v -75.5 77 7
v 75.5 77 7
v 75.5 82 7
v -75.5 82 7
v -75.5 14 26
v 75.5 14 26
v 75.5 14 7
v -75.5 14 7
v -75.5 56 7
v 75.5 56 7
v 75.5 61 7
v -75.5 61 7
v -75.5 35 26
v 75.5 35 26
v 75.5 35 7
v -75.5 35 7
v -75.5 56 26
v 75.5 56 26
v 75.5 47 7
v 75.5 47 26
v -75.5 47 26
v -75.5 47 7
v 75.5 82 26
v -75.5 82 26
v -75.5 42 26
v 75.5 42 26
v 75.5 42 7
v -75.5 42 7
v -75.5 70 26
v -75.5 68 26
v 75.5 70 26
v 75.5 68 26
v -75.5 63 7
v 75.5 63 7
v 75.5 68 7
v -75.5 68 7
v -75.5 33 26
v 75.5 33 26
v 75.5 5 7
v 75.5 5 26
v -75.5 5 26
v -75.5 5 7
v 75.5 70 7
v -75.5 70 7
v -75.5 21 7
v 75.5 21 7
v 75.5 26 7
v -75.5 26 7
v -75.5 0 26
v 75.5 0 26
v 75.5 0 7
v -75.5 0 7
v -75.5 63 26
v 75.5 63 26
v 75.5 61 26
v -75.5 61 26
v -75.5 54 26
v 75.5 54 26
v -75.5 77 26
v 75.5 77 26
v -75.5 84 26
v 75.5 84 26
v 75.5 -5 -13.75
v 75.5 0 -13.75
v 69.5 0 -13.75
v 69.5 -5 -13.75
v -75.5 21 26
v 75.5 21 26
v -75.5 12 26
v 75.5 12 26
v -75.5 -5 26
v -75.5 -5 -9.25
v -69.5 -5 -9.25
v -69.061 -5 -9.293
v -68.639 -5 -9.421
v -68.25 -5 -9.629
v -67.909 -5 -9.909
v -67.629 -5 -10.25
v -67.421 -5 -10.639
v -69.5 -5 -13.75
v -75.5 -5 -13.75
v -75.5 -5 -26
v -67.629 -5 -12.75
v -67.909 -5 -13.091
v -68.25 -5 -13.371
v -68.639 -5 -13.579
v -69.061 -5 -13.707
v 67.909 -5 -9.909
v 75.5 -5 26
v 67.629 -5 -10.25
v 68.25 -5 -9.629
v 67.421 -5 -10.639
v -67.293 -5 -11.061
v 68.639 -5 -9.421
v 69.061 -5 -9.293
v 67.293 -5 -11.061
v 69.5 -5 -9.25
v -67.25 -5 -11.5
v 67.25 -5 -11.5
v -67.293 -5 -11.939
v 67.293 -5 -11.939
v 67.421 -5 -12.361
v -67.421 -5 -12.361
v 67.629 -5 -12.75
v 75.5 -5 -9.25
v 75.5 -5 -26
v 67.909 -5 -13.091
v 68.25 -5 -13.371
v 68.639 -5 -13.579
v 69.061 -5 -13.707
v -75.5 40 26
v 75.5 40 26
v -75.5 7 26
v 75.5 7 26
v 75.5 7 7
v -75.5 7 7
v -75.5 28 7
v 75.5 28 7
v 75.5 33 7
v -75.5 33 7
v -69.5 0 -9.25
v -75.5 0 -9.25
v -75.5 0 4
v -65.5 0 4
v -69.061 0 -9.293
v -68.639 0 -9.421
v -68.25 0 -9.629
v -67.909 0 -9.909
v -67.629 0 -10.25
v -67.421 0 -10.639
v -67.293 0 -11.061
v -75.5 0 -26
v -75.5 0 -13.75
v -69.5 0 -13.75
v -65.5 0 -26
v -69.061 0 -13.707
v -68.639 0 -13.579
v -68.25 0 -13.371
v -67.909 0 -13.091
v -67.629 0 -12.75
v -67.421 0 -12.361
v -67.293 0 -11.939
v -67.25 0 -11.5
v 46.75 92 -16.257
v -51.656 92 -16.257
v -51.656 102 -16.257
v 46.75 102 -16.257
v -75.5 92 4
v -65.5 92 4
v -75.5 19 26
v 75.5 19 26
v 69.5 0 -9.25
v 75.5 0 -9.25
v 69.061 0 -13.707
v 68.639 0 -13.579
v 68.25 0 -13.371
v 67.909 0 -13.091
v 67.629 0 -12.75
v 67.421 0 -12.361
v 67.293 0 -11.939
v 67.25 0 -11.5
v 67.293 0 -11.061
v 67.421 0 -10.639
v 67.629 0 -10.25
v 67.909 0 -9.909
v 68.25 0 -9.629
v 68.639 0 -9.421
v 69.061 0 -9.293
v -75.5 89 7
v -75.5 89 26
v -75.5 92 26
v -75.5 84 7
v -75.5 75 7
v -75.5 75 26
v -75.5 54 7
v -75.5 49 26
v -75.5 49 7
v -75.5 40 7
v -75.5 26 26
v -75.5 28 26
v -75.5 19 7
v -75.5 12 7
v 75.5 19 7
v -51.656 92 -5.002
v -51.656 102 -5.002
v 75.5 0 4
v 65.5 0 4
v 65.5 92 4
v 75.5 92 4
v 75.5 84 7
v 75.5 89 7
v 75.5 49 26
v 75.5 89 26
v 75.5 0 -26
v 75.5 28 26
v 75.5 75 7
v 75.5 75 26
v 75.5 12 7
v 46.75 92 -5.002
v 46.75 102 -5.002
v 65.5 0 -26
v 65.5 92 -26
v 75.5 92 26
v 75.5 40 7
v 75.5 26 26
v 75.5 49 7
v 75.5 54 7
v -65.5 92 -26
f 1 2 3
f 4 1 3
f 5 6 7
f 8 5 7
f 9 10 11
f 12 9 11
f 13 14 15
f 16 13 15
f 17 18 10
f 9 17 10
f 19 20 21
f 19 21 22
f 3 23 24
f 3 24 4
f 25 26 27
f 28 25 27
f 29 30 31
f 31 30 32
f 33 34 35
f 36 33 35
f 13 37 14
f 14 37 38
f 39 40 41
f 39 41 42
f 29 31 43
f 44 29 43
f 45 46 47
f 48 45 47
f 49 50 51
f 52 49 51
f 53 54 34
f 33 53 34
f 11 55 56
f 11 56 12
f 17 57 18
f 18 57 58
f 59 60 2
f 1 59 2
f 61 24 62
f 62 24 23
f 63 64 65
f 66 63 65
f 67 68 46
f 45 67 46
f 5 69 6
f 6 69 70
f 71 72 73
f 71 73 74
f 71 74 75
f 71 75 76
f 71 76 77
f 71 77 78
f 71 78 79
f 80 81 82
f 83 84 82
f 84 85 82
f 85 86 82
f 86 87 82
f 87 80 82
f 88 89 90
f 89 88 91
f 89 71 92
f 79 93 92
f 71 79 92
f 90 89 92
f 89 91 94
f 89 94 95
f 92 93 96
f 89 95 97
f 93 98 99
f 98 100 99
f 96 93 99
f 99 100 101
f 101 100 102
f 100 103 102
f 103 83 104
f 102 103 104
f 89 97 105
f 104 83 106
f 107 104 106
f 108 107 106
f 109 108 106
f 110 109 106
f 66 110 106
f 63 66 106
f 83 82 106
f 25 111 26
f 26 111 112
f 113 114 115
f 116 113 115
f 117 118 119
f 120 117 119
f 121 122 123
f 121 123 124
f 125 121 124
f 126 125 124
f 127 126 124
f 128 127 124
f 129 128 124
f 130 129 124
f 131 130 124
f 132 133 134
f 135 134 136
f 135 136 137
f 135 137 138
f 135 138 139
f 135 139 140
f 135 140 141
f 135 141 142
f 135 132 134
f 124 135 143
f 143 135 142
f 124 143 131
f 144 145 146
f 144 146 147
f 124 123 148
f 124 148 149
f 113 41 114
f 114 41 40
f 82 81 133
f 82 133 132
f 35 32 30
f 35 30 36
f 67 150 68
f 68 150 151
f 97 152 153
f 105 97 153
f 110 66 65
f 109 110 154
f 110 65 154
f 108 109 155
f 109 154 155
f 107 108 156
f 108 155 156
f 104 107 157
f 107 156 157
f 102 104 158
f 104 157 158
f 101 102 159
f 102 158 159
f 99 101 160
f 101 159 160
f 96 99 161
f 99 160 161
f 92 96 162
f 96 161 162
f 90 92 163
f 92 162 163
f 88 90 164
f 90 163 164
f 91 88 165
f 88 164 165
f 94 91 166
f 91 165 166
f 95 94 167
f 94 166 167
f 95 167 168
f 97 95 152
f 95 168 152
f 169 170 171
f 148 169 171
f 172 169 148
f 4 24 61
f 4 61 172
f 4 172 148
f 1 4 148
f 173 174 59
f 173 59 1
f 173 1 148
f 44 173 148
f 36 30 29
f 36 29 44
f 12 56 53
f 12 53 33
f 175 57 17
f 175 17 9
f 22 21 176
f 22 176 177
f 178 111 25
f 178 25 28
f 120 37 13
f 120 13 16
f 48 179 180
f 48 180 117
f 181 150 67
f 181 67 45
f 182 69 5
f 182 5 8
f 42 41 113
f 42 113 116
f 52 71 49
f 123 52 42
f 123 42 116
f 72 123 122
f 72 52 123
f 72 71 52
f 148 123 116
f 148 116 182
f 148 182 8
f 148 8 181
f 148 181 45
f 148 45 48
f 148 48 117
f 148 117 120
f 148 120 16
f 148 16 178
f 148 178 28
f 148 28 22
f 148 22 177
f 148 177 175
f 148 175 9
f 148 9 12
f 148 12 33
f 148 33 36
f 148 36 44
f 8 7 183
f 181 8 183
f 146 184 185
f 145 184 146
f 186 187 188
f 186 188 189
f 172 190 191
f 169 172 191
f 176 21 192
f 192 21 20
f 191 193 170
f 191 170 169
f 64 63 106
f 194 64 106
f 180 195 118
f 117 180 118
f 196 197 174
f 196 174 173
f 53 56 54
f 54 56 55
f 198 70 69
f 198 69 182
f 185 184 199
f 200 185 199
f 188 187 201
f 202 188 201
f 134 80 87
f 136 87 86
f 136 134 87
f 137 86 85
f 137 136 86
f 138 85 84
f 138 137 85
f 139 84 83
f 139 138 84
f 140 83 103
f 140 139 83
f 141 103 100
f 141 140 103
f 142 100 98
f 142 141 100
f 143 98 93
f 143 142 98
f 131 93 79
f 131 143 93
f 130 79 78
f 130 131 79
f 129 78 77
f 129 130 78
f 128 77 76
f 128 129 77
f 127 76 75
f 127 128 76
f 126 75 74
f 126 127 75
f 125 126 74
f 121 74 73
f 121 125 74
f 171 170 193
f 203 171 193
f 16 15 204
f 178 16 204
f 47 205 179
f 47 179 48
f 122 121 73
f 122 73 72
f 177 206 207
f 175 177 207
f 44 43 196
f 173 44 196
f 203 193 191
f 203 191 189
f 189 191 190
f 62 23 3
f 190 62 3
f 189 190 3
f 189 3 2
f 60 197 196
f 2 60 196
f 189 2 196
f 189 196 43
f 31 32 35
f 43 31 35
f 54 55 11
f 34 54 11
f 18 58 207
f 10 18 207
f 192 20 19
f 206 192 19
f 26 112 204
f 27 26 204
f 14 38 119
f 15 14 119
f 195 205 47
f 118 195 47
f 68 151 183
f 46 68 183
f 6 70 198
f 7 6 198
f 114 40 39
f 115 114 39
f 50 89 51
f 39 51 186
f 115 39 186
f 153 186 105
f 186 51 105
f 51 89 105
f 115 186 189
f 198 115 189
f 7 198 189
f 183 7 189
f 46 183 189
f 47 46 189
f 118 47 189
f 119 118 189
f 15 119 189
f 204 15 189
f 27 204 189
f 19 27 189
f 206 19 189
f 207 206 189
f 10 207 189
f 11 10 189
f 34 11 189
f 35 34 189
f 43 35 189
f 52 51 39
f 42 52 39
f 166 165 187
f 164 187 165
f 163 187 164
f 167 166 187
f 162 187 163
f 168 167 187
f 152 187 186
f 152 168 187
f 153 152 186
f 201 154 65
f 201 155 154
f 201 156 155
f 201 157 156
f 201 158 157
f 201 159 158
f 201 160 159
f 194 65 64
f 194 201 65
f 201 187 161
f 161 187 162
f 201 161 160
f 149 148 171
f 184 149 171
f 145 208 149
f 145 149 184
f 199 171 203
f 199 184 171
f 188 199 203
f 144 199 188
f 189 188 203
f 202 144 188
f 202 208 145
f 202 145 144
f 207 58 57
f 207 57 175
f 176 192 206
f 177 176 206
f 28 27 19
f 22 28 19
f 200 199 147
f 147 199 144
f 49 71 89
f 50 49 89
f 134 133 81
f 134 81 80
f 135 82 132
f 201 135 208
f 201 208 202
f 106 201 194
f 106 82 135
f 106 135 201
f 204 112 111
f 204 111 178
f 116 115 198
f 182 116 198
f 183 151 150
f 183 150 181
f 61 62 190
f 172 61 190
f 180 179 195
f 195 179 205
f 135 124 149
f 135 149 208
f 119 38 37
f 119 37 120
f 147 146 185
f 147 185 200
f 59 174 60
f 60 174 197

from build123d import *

# Parameters (mm, degrees)
BOSS_EXTRUDE1_DEPTH            = 92
BOSS_EXTRUDE1_DEPTH_BACK       = 5
SKETCH1_W                      = 151
SKETCH1_H                      = 52
CUT_EXTRUDE1_REACH             = 123.821
SKETCH2_W                      = 10
SKETCH2_H                      = 30
CUT_EXTRUDE2_REACH             = 123.821
CUT_EXTRUDE3_REACH             = 123.821
SKETCH4_W                      = 19
SKETCH4_H                      = 5
CUT_EXTRUDE3_DIRECTION_2_REACH = 123.821
LPATTERN1_COUNT                = 13
LPATTERN1_PITCH                = 7
SKETCH5_W                      = 98.406366265
SKETCH5_H                      = 11.254687051
BOSS_EXTRUDE2_DEPTH            = 10


with BuildPart() as part:
    # Sketch1 → Boss-Extrude1 (new, two sides: drawn at the far end of the back side and taken through both)
    with BuildSketch(Plane(origin=(0, 0, 0), x_dir=(1, 0, 0), z_dir=(0, 1, 0)).offset(-BOSS_EXTRUDE1_DEPTH_BACK)):
        Rectangle(SKETCH1_W, SKETCH1_H)
    extrude(amount=BOSS_EXTRUDE1_DEPTH + BOSS_EXTRUDE1_DEPTH_BACK)

    # Sketch2 → Cut-Extrude1 (cut, up to next)
    with BuildSketch(Plane(origin=(0, 0, 0), x_dir=(1, 0, 0), z_dir=(0, 1, 0)), mode=Mode.PRIVATE) as cut_extrude1_sk1:
        with Locations((-70.5, 11)):
            Rectangle(SKETCH2_W, SKETCH2_H)
    cut_extrude1_tool1 = extrude(cut_extrude1_sk1.sketch, amount=CUT_EXTRUDE1_REACH, mode=Mode.PRIVATE) & part.part
    # Sketch2 → Cut-Extrude1 (cut, up to next)
    with BuildSketch(Plane(origin=(0, 0, 0), x_dir=(1, 0, 0), z_dir=(0, 1, 0)), mode=Mode.PRIVATE) as cut_extrude1_sk2:
        with Locations((70.5, 11)):
            Rectangle(SKETCH2_W, SKETCH2_H)
    cut_extrude1_tool2 = extrude(cut_extrude1_sk2.sketch, amount=CUT_EXTRUDE1_REACH, mode=Mode.PRIVATE) & part.part
    add(cut_extrude1_tool1.solids().sort_by_distance((-70.5, 0, -11))[0], mode=Mode.SUBTRACT)
    add(cut_extrude1_tool2.solids().sort_by_distance((70.5, 0, -11))[0], mode=Mode.SUBTRACT)

    # Sketch3 → Cut-Extrude2 (cut, up to next)
    with BuildSketch(Plane(origin=(0, 0, 0), x_dir=(1, 0, 0), z_dir=(0, 1, 0)), mode=Mode.PRIVATE) as cut_extrude2_sk1:
        with BuildLine():
            Line((-69.5, 9.25), (-75.5, 9.25))
            Line((-75.5, 9.25), (-75.5, 13.75))
            Line((-75.5, 13.75), (-69.5, 13.75))
            ThreePointArc((-69.5, 13.75), (-67.25, 11.5), (-69.5, 9.25))
        make_face()
    cut_extrude2_tool1 = extrude(cut_extrude2_sk1.sketch, amount=-CUT_EXTRUDE2_REACH, mode=Mode.PRIVATE) & part.part
    cut_extrude2 = cut_extrude2_tool1.solids().sort_by_distance((-71.600192, 0, -11.5))[0]
    add(cut_extrude2, mode=Mode.SUBTRACT)

    # Mirror1: Cut-Extrude2 across plane
    add(cut_extrude2.mirror(Plane(origin=(0, 0, 0), x_dir=(0, 0, 1), z_dir=(1, 0, 0))), mode=Mode.SUBTRACT)

    # Sketch4 → Cut-Extrude3 (cut, up to next)
    with BuildSketch(Plane(origin=(0, 0, 0), x_dir=(0, 0, -1), z_dir=(1, 0, 0)), mode=Mode.PRIVATE) as cut_extrude3_sk1:
        with Locations((-16.5, 2.5)):
            Rectangle(SKETCH4_W, SKETCH4_H)
    cut_extrude3_tool1 = extrude(cut_extrude3_sk1.sketch, amount=-CUT_EXTRUDE3_REACH, mode=Mode.PRIVATE) & part.part
    cut_extrude3 = cut_extrude3_tool1.solids().sort_by_distance((0, 2.5, 16.5))[0]
    add(cut_extrude3, mode=Mode.SUBTRACT)

    # Sketch4 → Cut-Extrude3 direction 2 (cut, up to next)
    with BuildSketch(Plane(origin=(0, 0, 0), x_dir=(0, 0, -1), z_dir=(1, 0, 0)), mode=Mode.PRIVATE) as cut_extrude3_direction_2_sk1:
        with Locations((-16.5, 2.5)):
            Rectangle(SKETCH4_W, SKETCH4_H)
    cut_extrude3_direction_2_tool1 = extrude(cut_extrude3_direction_2_sk1.sketch, amount=CUT_EXTRUDE3_DIRECTION_2_REACH, mode=Mode.PRIVATE) & part.part
    cut_extrude3_direction_2 = cut_extrude3_direction_2_tool1.solids().sort_by_distance((0, 2.5, 16.5))[0]
    add(cut_extrude3_direction_2, mode=Mode.SUBTRACT)

    # LPattern1: Cut-Extrude3, Cut-Extrude3 direction 2 ×13
    with Locations(*[(0, i * LPATTERN1_PITCH, 0) for i in range(1, LPATTERN1_COUNT)]):
        add(cut_extrude3, mode=Mode.SUBTRACT)
        add(cut_extrude3_direction_2, mode=Mode.SUBTRACT)

    # Sketch5 → Boss-Extrude2 (add)
    with BuildSketch(Plane(origin=(0, 92, 0), x_dir=(1, 0, 0), z_dir=(0, 1, 0))):
        with Locations((-2.452944614, 10.629426659)):
            Rectangle(SKETCH5_W, SKETCH5_H)
    extrude(amount=BOSS_EXTRUDE2_DEPTH)


solid = part.part
